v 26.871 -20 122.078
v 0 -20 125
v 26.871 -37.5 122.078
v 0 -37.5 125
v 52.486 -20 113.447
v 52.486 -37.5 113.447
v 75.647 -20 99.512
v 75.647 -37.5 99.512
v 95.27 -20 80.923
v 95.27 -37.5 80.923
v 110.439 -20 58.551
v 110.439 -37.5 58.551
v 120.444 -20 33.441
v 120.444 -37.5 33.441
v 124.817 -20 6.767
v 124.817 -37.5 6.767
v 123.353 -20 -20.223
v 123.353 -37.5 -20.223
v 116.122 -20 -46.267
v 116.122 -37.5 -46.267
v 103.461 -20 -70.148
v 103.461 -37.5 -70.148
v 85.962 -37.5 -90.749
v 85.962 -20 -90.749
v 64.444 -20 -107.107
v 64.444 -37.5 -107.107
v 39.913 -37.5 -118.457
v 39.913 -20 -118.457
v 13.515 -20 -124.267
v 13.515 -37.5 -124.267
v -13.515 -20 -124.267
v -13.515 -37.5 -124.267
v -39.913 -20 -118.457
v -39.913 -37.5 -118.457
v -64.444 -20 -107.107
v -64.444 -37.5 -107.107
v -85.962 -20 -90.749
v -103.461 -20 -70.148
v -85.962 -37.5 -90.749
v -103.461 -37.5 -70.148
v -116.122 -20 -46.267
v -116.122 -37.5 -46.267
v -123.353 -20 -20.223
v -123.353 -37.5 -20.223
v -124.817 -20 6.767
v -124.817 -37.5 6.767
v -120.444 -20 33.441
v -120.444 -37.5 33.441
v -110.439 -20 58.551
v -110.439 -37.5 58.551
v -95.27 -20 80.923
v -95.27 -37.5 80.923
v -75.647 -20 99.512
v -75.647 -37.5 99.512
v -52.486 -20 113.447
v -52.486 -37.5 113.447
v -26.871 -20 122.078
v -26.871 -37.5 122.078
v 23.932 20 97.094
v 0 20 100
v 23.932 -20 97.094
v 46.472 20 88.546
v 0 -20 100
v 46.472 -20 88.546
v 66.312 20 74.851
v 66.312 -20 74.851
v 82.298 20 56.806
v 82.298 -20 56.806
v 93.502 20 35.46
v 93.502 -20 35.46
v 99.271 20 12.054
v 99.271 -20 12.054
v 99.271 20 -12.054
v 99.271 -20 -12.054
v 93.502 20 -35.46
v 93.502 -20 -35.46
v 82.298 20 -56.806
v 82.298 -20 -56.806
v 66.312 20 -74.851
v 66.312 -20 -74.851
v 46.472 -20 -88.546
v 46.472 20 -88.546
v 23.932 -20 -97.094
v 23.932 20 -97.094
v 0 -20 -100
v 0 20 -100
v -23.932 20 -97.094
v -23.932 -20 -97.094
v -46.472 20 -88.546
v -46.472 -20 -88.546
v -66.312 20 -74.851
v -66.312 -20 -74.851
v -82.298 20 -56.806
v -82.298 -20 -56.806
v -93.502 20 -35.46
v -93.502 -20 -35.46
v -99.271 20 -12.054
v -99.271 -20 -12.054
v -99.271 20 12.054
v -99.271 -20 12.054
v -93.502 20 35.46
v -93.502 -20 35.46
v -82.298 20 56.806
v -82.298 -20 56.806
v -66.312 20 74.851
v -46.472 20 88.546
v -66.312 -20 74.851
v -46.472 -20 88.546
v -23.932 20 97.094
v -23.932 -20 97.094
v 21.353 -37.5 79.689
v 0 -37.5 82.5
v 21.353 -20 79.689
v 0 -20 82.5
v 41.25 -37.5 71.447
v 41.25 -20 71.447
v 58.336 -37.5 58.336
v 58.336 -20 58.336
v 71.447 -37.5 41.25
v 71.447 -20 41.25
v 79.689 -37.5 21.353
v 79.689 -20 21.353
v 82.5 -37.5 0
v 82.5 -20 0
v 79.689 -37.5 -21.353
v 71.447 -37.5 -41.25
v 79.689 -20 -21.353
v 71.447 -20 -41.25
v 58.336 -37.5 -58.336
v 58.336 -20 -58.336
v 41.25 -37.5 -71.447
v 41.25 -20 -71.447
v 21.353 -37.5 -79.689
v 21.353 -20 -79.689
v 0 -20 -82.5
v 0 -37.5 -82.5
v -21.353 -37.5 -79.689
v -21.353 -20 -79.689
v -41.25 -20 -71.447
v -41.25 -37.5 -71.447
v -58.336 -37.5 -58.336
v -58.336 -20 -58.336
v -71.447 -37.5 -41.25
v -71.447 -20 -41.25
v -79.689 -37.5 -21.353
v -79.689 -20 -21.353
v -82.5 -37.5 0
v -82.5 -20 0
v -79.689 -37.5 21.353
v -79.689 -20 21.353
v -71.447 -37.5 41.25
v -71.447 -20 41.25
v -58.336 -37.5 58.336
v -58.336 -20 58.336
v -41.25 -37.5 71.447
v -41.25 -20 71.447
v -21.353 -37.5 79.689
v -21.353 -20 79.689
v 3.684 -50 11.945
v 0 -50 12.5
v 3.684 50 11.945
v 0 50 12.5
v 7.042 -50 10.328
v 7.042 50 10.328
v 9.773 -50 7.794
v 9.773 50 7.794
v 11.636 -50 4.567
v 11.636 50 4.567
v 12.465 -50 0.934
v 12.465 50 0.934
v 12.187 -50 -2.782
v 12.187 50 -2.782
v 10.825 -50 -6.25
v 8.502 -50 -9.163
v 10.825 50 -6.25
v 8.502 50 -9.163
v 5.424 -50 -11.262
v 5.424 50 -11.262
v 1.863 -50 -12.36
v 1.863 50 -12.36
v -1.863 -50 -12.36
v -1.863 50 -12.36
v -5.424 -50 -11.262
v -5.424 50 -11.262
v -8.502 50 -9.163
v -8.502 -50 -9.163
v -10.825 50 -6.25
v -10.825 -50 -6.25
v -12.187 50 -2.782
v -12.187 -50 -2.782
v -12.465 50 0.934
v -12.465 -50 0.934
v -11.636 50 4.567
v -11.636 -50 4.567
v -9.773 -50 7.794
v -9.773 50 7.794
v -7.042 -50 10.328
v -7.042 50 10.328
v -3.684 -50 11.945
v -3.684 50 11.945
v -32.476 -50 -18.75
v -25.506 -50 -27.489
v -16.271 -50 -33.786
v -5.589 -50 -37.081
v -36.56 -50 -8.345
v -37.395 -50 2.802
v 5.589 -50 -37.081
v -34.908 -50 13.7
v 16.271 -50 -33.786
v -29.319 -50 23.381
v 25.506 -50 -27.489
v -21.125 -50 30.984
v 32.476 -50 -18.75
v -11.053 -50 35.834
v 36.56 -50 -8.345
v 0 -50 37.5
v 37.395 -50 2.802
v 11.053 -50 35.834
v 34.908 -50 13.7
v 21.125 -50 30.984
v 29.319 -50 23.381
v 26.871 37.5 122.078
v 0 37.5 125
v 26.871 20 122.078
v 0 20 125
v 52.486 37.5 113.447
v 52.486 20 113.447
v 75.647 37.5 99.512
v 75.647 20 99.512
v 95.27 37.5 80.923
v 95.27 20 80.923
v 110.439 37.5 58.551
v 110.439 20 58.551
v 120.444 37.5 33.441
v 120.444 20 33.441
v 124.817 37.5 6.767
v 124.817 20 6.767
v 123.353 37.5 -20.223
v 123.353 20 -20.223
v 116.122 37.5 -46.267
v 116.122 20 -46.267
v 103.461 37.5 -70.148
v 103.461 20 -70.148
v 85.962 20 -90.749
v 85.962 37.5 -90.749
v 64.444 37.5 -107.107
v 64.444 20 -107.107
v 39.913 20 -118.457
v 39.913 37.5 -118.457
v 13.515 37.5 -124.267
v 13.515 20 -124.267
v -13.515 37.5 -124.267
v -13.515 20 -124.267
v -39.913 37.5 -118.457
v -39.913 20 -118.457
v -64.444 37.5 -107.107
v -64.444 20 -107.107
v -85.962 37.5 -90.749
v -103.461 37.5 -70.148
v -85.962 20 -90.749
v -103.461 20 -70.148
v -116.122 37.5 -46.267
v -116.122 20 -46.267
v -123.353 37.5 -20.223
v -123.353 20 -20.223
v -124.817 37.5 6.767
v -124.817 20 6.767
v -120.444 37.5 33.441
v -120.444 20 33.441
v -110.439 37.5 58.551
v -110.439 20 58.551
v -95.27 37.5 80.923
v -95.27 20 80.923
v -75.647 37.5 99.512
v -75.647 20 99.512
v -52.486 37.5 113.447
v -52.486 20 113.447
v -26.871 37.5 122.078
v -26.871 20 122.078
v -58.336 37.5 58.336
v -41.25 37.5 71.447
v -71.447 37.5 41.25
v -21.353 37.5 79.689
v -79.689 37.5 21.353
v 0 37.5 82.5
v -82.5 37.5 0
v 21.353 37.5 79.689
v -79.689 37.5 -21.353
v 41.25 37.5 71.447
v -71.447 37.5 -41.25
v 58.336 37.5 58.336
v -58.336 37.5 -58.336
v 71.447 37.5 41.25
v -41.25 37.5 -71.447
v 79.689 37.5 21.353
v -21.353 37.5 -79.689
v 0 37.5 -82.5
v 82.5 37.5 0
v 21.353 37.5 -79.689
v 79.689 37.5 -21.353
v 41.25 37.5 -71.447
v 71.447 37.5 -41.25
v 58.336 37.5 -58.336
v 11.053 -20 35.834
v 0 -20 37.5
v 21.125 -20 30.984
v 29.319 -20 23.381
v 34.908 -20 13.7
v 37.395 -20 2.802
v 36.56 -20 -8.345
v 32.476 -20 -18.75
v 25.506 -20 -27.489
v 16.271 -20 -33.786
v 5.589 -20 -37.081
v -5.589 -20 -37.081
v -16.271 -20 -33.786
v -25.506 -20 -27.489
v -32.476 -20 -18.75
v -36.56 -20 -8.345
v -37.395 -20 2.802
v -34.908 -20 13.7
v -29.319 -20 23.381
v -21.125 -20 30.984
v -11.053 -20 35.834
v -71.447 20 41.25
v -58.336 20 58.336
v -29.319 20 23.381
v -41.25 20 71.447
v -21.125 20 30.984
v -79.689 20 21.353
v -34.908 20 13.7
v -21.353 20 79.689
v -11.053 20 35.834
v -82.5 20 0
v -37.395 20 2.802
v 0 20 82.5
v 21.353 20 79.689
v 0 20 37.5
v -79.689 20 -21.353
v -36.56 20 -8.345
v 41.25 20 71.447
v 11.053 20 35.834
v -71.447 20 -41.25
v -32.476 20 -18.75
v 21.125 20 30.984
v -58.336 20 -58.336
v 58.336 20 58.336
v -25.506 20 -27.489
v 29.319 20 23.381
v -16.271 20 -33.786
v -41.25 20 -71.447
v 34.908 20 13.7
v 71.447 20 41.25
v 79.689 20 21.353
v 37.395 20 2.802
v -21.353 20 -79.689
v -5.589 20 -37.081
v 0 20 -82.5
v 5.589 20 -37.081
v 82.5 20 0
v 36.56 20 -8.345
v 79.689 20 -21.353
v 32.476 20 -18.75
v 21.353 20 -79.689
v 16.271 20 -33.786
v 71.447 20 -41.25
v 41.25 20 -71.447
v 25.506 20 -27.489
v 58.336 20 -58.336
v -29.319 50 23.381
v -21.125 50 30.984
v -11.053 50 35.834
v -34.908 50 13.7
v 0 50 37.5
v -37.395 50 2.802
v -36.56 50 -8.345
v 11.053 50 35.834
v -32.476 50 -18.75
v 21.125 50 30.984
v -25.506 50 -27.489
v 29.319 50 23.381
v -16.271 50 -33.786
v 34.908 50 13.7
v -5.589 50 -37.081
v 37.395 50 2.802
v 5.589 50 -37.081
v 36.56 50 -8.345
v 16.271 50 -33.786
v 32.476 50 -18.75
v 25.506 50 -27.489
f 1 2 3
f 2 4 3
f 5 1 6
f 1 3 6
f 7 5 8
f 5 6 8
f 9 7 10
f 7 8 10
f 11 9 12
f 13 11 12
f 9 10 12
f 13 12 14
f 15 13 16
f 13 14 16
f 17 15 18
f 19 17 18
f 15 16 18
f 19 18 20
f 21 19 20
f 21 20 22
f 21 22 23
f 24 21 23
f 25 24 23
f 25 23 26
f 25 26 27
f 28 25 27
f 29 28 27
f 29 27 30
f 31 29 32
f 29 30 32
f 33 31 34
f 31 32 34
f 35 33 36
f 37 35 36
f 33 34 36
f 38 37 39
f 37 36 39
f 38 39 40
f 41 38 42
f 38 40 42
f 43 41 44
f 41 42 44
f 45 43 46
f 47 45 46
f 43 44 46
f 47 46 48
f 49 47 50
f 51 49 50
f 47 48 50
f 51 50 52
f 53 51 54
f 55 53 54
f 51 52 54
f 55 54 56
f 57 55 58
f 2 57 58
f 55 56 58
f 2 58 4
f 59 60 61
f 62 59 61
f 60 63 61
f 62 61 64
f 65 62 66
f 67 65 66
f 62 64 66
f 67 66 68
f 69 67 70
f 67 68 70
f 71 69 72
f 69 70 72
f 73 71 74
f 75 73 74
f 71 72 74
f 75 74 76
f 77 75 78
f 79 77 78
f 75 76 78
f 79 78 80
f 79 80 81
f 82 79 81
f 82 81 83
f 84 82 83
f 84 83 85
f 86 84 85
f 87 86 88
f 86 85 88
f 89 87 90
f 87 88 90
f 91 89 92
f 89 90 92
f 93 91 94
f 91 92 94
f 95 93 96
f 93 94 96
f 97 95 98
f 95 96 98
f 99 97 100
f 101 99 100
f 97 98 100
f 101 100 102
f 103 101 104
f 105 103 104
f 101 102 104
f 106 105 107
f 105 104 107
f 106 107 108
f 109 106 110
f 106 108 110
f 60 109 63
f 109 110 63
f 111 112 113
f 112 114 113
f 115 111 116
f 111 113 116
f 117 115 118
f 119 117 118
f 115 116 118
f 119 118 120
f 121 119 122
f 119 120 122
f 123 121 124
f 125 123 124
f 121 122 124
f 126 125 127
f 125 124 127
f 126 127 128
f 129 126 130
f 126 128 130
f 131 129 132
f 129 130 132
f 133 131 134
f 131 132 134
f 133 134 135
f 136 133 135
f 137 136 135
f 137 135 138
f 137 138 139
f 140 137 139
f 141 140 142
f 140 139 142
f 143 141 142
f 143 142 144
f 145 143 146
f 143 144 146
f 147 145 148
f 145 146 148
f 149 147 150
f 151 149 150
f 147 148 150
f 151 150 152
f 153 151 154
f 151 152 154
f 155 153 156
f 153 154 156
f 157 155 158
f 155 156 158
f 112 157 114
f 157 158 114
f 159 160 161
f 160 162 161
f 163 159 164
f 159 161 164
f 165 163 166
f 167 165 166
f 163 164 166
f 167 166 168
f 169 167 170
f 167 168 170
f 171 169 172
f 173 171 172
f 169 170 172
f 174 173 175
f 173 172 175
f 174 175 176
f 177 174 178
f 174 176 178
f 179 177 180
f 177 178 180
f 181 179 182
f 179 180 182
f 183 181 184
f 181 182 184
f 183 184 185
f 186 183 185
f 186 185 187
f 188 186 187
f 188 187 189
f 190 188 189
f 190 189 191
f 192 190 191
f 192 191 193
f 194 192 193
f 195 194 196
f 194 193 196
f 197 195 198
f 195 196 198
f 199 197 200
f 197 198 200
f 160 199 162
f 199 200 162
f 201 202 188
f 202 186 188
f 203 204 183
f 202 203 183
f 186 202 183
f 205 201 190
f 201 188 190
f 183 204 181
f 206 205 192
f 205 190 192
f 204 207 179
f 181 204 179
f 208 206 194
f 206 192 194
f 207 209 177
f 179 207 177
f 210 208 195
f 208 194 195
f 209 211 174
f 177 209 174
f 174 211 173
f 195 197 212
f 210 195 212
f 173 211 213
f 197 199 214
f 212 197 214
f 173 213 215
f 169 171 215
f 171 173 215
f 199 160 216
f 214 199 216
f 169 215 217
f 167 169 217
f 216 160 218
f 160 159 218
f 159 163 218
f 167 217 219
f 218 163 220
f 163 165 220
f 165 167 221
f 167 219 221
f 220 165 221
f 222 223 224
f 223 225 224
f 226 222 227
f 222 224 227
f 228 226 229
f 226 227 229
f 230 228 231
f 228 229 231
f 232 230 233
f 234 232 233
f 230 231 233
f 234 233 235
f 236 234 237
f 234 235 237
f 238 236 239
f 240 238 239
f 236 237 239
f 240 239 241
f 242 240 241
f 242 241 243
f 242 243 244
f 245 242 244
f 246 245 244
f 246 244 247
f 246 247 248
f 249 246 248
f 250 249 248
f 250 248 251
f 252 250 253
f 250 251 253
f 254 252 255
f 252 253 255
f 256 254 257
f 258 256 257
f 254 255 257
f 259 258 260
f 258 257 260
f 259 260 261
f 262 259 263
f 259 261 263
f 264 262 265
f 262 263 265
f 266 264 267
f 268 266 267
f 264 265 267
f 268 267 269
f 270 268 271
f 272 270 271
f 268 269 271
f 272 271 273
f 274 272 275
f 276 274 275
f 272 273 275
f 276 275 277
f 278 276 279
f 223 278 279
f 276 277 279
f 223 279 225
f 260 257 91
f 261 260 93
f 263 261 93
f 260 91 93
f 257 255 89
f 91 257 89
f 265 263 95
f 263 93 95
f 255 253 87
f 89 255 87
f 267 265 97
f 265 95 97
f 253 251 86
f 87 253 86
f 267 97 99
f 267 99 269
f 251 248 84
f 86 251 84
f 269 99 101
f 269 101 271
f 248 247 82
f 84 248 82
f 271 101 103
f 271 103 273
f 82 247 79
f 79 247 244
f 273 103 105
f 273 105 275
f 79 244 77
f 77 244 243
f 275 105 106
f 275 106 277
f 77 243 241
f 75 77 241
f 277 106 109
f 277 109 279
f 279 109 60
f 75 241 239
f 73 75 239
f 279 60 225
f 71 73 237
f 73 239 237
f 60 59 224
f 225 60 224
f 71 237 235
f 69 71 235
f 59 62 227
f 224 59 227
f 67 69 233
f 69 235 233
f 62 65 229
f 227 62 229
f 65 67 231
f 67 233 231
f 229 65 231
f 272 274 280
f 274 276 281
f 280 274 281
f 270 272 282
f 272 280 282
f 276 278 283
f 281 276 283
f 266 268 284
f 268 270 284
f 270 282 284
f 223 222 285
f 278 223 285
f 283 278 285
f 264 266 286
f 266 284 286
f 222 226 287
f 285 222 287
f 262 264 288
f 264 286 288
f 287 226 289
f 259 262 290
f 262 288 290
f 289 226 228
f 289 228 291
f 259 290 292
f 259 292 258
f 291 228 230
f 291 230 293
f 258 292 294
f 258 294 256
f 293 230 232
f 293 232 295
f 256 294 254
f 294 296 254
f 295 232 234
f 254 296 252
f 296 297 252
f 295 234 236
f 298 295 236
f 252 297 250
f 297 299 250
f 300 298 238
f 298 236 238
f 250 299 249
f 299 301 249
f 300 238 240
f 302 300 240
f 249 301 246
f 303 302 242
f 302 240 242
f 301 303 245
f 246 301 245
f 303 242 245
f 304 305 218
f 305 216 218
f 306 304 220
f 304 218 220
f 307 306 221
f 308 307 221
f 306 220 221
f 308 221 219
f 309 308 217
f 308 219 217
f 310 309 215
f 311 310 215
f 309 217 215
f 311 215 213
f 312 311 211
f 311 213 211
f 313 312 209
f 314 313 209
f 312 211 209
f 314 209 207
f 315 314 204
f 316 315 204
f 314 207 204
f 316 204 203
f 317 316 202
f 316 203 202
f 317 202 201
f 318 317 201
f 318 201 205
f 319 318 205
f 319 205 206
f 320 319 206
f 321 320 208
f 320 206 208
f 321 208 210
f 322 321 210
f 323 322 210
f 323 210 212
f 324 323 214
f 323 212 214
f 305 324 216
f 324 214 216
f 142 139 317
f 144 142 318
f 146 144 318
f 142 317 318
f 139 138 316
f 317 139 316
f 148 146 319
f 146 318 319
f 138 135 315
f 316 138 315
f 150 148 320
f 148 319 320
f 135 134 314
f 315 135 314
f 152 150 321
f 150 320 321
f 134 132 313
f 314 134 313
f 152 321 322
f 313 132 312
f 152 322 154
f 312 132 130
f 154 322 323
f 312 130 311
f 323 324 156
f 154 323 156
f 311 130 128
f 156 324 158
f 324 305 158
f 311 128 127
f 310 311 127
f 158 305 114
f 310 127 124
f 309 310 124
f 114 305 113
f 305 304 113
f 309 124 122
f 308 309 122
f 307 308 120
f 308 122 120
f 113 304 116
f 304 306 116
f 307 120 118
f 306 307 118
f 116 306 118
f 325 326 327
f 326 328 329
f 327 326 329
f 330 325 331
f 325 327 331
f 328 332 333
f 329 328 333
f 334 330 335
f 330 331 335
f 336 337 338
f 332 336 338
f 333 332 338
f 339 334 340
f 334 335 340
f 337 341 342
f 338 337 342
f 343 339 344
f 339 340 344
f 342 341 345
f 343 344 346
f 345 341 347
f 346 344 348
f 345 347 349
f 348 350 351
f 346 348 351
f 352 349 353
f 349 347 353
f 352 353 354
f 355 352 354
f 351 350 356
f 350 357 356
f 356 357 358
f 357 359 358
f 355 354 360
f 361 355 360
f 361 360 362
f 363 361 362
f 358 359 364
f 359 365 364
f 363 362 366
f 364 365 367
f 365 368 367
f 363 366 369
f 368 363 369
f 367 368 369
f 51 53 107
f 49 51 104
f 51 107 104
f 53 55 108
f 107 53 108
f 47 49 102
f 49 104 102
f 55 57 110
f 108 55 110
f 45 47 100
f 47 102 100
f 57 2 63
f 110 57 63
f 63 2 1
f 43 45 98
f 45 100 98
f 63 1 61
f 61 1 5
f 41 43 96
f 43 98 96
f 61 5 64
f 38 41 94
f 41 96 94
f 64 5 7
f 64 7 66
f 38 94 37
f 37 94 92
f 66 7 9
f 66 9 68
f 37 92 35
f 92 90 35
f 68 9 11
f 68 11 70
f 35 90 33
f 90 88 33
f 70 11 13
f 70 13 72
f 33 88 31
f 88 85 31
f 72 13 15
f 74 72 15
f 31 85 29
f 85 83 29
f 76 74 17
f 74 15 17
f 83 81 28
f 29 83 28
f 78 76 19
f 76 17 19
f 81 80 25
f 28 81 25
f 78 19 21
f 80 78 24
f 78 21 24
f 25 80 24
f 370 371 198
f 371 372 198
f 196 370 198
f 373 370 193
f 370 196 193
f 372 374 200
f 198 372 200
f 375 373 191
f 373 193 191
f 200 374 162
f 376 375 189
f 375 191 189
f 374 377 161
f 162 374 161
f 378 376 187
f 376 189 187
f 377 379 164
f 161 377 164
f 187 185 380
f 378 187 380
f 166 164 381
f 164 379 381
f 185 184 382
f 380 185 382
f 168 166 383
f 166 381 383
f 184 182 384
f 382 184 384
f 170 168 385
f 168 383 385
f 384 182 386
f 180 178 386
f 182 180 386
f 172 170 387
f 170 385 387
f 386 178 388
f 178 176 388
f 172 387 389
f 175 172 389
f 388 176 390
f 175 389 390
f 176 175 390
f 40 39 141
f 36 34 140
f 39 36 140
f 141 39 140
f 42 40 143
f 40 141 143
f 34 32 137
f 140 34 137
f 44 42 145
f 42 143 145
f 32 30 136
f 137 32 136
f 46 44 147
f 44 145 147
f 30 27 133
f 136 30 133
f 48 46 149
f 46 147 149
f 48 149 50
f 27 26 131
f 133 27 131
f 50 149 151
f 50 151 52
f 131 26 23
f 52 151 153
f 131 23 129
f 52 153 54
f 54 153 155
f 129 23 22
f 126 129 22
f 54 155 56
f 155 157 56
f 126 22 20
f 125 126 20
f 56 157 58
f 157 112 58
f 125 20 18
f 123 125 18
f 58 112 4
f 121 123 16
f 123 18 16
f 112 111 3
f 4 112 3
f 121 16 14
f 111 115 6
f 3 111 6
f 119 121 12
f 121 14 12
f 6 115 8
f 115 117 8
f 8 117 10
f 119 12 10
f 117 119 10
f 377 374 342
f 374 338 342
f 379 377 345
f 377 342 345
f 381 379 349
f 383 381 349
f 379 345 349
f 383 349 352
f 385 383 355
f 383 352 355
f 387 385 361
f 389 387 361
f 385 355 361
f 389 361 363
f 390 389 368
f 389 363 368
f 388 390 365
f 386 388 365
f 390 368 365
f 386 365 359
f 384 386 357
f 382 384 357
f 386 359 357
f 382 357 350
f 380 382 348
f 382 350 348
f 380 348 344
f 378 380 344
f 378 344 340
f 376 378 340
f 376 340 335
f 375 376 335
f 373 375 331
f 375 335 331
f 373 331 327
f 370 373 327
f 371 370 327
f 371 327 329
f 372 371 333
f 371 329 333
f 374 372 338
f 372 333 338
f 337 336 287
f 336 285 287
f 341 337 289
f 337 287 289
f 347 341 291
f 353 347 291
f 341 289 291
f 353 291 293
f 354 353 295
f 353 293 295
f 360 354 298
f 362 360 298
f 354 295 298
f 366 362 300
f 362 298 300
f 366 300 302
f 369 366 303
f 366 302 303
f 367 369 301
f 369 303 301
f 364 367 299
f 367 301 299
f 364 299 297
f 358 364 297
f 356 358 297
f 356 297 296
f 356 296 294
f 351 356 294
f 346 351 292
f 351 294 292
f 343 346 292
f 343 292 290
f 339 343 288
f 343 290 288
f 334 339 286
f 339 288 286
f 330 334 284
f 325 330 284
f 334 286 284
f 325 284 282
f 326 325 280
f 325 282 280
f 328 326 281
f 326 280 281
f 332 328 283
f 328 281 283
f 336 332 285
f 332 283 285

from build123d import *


with BuildPart() as f1:
    # F0 (on Right) → F1 (revolve)
    with BuildSketch(Plane.YZ):
        Polygon((20, 100), (0, 100), (-20, 100), (-20, 125), (-37.5, 125), (-37.5, 82.5), (-20, 82.5), (-20, 37.5), (-50, 37.5), (-50, 12.5), (0, 12.5), (50, 12.5), (50, 37.5), (20, 37.5), (20, 82.5), (37.5, 82.5), (37.5, 125), (20, 125), align=None)
    revolve(axis=Axis((0, -3.476026, 0), (0, 1, 0)))


solid = f1.part
